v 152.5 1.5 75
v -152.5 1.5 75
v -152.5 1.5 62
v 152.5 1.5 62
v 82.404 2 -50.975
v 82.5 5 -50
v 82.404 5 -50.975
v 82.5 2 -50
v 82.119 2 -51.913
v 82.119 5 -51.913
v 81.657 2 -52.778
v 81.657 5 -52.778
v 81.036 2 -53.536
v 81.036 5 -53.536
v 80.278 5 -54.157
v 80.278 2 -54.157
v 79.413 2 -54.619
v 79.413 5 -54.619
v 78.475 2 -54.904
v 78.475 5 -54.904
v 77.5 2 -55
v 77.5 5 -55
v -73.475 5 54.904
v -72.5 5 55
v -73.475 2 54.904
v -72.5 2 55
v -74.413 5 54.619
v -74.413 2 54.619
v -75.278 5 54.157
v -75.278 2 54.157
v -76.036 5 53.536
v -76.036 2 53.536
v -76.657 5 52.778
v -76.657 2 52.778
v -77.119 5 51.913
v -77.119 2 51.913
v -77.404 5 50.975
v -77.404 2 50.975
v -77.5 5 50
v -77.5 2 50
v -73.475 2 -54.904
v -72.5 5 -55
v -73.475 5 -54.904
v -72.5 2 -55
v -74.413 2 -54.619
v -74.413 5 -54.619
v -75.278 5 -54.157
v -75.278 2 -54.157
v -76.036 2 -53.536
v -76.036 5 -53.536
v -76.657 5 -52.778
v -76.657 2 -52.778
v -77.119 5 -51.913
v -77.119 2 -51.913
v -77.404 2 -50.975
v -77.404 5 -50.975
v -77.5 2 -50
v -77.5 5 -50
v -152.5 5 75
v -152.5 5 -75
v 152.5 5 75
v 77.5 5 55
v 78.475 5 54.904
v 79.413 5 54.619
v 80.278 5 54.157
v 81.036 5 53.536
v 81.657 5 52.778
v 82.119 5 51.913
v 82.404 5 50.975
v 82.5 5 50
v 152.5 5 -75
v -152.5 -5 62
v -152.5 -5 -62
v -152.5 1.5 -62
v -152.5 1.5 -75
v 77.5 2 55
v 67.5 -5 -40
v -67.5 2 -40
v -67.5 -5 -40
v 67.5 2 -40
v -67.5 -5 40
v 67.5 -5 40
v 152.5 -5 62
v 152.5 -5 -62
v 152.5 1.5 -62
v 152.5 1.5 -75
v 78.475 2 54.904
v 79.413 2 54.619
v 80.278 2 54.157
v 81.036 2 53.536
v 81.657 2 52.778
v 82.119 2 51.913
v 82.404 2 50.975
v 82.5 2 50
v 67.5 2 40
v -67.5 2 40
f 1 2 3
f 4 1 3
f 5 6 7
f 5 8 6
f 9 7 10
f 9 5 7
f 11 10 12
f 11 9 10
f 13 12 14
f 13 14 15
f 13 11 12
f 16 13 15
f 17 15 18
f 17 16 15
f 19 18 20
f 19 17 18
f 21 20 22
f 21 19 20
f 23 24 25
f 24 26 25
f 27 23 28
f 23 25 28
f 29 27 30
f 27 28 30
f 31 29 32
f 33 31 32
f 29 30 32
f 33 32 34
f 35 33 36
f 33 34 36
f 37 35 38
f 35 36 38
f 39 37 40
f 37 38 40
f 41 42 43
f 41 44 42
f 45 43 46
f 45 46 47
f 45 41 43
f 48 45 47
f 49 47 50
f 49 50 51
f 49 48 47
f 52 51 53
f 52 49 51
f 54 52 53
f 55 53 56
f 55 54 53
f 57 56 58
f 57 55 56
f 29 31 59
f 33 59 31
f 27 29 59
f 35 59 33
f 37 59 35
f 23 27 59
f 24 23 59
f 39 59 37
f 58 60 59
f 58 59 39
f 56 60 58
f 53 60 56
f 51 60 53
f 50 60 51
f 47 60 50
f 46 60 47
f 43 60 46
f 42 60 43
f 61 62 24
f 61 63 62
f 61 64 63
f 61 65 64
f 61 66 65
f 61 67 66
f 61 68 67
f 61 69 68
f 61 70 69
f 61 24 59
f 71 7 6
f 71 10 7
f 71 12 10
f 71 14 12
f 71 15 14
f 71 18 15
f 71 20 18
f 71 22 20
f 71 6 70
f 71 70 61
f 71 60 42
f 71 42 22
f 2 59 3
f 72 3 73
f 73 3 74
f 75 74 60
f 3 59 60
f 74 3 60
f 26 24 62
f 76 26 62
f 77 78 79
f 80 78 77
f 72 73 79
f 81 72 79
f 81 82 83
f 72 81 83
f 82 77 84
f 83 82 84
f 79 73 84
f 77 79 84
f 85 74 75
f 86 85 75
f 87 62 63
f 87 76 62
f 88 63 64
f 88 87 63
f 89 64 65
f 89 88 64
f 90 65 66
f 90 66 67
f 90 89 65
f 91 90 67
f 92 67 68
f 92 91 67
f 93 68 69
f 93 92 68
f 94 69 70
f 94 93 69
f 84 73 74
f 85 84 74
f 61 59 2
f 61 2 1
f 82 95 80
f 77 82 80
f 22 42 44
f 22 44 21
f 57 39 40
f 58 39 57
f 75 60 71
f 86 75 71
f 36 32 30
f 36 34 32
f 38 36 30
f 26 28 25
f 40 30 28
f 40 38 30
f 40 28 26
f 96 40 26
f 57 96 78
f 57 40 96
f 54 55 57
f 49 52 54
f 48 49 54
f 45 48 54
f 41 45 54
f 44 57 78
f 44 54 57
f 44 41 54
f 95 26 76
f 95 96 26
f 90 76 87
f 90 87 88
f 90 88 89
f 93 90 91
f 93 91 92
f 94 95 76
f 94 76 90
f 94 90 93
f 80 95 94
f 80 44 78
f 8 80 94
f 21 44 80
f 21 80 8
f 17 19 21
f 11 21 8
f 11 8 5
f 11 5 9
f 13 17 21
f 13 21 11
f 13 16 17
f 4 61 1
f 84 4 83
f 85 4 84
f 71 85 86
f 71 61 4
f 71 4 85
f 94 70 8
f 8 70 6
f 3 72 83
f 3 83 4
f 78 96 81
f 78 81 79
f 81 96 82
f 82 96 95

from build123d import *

# Parameters (mm, degrees)
SKETCH2_W           = 305
SKETCH2_H           = 150
BOSS_EXTRUDE1_DEPTH = 5
SKETCH3_W           = 13
SKETCH3_H           = 6.5
CUT_EXTRUDE1_DEPTH  = 305
SKETCH4_W           = 160
SKETCH4_H           = 110
CUT_EXTRUDE2_DEPTH  = 3
FILLET1_R           = 5
SKETCH5_W           = 135
SKETCH5_H           = 80
CUT_EXTRUDE3_DEPTH  = 8


with BuildPart() as part:
    # Sketch2 → Boss-Extrude1 (new body, symmetric)
    with BuildSketch(Plane(origin=(0, 0, 0), x_dir=(1, 0, 0), z_dir=(0, 1, 0))):
        Rectangle(SKETCH2_W, SKETCH2_H)
    extrude(amount=BOSS_EXTRUDE1_DEPTH, both=True)

    # Sketch3 → Cut-Extrude1 (cut)
    with BuildSketch(Plane(origin=(152.5, 0, 0), x_dir=(0, 0, -1), z_dir=(1, 0, 0))):
        with Locations((-68.5, -1.75)):
            Rectangle(SKETCH3_W, SKETCH3_H)
        with Locations((68.5, -1.75)):
            Rectangle(SKETCH3_W, SKETCH3_H)
    extrude(amount=-CUT_EXTRUDE1_DEPTH, mode=Mode.SUBTRACT)

    # Sketch4 → Cut-Extrude2 (cut)
    with BuildSketch(Plane(origin=(0, 5, 0), x_dir=(1, 0, 0), z_dir=(0, 1, 0))):
        with Locations((2.5, 0)):
            Rectangle(SKETCH4_W, SKETCH4_H)
    extrude(amount=-CUT_EXTRUDE2_DEPTH, mode=Mode.SUBTRACT)

    # Fillet1
    fillet1_edges = [part.edges().sort_by_distance(p)[0] for p in [
        (-77.5, 3.5, 55),
        (-77.5, 3.5, -55),
        (82.5, 3.5, -55),
        (82.5, 3.5, 55),
    ]]
    fillet(fillet1_edges, radius=FILLET1_R)

    # Sketch5 → Cut-Extrude3 (cut, through all)
    with BuildSketch(Plane(origin=(0, 2, 0), x_dir=(1, 0, 0), z_dir=(0, 1, 0))):
        Rectangle(SKETCH5_W, SKETCH5_H)
    extrude(amount=-CUT_EXTRUDE3_DEPTH, mode=Mode.SUBTRACT)


solid = part.part
